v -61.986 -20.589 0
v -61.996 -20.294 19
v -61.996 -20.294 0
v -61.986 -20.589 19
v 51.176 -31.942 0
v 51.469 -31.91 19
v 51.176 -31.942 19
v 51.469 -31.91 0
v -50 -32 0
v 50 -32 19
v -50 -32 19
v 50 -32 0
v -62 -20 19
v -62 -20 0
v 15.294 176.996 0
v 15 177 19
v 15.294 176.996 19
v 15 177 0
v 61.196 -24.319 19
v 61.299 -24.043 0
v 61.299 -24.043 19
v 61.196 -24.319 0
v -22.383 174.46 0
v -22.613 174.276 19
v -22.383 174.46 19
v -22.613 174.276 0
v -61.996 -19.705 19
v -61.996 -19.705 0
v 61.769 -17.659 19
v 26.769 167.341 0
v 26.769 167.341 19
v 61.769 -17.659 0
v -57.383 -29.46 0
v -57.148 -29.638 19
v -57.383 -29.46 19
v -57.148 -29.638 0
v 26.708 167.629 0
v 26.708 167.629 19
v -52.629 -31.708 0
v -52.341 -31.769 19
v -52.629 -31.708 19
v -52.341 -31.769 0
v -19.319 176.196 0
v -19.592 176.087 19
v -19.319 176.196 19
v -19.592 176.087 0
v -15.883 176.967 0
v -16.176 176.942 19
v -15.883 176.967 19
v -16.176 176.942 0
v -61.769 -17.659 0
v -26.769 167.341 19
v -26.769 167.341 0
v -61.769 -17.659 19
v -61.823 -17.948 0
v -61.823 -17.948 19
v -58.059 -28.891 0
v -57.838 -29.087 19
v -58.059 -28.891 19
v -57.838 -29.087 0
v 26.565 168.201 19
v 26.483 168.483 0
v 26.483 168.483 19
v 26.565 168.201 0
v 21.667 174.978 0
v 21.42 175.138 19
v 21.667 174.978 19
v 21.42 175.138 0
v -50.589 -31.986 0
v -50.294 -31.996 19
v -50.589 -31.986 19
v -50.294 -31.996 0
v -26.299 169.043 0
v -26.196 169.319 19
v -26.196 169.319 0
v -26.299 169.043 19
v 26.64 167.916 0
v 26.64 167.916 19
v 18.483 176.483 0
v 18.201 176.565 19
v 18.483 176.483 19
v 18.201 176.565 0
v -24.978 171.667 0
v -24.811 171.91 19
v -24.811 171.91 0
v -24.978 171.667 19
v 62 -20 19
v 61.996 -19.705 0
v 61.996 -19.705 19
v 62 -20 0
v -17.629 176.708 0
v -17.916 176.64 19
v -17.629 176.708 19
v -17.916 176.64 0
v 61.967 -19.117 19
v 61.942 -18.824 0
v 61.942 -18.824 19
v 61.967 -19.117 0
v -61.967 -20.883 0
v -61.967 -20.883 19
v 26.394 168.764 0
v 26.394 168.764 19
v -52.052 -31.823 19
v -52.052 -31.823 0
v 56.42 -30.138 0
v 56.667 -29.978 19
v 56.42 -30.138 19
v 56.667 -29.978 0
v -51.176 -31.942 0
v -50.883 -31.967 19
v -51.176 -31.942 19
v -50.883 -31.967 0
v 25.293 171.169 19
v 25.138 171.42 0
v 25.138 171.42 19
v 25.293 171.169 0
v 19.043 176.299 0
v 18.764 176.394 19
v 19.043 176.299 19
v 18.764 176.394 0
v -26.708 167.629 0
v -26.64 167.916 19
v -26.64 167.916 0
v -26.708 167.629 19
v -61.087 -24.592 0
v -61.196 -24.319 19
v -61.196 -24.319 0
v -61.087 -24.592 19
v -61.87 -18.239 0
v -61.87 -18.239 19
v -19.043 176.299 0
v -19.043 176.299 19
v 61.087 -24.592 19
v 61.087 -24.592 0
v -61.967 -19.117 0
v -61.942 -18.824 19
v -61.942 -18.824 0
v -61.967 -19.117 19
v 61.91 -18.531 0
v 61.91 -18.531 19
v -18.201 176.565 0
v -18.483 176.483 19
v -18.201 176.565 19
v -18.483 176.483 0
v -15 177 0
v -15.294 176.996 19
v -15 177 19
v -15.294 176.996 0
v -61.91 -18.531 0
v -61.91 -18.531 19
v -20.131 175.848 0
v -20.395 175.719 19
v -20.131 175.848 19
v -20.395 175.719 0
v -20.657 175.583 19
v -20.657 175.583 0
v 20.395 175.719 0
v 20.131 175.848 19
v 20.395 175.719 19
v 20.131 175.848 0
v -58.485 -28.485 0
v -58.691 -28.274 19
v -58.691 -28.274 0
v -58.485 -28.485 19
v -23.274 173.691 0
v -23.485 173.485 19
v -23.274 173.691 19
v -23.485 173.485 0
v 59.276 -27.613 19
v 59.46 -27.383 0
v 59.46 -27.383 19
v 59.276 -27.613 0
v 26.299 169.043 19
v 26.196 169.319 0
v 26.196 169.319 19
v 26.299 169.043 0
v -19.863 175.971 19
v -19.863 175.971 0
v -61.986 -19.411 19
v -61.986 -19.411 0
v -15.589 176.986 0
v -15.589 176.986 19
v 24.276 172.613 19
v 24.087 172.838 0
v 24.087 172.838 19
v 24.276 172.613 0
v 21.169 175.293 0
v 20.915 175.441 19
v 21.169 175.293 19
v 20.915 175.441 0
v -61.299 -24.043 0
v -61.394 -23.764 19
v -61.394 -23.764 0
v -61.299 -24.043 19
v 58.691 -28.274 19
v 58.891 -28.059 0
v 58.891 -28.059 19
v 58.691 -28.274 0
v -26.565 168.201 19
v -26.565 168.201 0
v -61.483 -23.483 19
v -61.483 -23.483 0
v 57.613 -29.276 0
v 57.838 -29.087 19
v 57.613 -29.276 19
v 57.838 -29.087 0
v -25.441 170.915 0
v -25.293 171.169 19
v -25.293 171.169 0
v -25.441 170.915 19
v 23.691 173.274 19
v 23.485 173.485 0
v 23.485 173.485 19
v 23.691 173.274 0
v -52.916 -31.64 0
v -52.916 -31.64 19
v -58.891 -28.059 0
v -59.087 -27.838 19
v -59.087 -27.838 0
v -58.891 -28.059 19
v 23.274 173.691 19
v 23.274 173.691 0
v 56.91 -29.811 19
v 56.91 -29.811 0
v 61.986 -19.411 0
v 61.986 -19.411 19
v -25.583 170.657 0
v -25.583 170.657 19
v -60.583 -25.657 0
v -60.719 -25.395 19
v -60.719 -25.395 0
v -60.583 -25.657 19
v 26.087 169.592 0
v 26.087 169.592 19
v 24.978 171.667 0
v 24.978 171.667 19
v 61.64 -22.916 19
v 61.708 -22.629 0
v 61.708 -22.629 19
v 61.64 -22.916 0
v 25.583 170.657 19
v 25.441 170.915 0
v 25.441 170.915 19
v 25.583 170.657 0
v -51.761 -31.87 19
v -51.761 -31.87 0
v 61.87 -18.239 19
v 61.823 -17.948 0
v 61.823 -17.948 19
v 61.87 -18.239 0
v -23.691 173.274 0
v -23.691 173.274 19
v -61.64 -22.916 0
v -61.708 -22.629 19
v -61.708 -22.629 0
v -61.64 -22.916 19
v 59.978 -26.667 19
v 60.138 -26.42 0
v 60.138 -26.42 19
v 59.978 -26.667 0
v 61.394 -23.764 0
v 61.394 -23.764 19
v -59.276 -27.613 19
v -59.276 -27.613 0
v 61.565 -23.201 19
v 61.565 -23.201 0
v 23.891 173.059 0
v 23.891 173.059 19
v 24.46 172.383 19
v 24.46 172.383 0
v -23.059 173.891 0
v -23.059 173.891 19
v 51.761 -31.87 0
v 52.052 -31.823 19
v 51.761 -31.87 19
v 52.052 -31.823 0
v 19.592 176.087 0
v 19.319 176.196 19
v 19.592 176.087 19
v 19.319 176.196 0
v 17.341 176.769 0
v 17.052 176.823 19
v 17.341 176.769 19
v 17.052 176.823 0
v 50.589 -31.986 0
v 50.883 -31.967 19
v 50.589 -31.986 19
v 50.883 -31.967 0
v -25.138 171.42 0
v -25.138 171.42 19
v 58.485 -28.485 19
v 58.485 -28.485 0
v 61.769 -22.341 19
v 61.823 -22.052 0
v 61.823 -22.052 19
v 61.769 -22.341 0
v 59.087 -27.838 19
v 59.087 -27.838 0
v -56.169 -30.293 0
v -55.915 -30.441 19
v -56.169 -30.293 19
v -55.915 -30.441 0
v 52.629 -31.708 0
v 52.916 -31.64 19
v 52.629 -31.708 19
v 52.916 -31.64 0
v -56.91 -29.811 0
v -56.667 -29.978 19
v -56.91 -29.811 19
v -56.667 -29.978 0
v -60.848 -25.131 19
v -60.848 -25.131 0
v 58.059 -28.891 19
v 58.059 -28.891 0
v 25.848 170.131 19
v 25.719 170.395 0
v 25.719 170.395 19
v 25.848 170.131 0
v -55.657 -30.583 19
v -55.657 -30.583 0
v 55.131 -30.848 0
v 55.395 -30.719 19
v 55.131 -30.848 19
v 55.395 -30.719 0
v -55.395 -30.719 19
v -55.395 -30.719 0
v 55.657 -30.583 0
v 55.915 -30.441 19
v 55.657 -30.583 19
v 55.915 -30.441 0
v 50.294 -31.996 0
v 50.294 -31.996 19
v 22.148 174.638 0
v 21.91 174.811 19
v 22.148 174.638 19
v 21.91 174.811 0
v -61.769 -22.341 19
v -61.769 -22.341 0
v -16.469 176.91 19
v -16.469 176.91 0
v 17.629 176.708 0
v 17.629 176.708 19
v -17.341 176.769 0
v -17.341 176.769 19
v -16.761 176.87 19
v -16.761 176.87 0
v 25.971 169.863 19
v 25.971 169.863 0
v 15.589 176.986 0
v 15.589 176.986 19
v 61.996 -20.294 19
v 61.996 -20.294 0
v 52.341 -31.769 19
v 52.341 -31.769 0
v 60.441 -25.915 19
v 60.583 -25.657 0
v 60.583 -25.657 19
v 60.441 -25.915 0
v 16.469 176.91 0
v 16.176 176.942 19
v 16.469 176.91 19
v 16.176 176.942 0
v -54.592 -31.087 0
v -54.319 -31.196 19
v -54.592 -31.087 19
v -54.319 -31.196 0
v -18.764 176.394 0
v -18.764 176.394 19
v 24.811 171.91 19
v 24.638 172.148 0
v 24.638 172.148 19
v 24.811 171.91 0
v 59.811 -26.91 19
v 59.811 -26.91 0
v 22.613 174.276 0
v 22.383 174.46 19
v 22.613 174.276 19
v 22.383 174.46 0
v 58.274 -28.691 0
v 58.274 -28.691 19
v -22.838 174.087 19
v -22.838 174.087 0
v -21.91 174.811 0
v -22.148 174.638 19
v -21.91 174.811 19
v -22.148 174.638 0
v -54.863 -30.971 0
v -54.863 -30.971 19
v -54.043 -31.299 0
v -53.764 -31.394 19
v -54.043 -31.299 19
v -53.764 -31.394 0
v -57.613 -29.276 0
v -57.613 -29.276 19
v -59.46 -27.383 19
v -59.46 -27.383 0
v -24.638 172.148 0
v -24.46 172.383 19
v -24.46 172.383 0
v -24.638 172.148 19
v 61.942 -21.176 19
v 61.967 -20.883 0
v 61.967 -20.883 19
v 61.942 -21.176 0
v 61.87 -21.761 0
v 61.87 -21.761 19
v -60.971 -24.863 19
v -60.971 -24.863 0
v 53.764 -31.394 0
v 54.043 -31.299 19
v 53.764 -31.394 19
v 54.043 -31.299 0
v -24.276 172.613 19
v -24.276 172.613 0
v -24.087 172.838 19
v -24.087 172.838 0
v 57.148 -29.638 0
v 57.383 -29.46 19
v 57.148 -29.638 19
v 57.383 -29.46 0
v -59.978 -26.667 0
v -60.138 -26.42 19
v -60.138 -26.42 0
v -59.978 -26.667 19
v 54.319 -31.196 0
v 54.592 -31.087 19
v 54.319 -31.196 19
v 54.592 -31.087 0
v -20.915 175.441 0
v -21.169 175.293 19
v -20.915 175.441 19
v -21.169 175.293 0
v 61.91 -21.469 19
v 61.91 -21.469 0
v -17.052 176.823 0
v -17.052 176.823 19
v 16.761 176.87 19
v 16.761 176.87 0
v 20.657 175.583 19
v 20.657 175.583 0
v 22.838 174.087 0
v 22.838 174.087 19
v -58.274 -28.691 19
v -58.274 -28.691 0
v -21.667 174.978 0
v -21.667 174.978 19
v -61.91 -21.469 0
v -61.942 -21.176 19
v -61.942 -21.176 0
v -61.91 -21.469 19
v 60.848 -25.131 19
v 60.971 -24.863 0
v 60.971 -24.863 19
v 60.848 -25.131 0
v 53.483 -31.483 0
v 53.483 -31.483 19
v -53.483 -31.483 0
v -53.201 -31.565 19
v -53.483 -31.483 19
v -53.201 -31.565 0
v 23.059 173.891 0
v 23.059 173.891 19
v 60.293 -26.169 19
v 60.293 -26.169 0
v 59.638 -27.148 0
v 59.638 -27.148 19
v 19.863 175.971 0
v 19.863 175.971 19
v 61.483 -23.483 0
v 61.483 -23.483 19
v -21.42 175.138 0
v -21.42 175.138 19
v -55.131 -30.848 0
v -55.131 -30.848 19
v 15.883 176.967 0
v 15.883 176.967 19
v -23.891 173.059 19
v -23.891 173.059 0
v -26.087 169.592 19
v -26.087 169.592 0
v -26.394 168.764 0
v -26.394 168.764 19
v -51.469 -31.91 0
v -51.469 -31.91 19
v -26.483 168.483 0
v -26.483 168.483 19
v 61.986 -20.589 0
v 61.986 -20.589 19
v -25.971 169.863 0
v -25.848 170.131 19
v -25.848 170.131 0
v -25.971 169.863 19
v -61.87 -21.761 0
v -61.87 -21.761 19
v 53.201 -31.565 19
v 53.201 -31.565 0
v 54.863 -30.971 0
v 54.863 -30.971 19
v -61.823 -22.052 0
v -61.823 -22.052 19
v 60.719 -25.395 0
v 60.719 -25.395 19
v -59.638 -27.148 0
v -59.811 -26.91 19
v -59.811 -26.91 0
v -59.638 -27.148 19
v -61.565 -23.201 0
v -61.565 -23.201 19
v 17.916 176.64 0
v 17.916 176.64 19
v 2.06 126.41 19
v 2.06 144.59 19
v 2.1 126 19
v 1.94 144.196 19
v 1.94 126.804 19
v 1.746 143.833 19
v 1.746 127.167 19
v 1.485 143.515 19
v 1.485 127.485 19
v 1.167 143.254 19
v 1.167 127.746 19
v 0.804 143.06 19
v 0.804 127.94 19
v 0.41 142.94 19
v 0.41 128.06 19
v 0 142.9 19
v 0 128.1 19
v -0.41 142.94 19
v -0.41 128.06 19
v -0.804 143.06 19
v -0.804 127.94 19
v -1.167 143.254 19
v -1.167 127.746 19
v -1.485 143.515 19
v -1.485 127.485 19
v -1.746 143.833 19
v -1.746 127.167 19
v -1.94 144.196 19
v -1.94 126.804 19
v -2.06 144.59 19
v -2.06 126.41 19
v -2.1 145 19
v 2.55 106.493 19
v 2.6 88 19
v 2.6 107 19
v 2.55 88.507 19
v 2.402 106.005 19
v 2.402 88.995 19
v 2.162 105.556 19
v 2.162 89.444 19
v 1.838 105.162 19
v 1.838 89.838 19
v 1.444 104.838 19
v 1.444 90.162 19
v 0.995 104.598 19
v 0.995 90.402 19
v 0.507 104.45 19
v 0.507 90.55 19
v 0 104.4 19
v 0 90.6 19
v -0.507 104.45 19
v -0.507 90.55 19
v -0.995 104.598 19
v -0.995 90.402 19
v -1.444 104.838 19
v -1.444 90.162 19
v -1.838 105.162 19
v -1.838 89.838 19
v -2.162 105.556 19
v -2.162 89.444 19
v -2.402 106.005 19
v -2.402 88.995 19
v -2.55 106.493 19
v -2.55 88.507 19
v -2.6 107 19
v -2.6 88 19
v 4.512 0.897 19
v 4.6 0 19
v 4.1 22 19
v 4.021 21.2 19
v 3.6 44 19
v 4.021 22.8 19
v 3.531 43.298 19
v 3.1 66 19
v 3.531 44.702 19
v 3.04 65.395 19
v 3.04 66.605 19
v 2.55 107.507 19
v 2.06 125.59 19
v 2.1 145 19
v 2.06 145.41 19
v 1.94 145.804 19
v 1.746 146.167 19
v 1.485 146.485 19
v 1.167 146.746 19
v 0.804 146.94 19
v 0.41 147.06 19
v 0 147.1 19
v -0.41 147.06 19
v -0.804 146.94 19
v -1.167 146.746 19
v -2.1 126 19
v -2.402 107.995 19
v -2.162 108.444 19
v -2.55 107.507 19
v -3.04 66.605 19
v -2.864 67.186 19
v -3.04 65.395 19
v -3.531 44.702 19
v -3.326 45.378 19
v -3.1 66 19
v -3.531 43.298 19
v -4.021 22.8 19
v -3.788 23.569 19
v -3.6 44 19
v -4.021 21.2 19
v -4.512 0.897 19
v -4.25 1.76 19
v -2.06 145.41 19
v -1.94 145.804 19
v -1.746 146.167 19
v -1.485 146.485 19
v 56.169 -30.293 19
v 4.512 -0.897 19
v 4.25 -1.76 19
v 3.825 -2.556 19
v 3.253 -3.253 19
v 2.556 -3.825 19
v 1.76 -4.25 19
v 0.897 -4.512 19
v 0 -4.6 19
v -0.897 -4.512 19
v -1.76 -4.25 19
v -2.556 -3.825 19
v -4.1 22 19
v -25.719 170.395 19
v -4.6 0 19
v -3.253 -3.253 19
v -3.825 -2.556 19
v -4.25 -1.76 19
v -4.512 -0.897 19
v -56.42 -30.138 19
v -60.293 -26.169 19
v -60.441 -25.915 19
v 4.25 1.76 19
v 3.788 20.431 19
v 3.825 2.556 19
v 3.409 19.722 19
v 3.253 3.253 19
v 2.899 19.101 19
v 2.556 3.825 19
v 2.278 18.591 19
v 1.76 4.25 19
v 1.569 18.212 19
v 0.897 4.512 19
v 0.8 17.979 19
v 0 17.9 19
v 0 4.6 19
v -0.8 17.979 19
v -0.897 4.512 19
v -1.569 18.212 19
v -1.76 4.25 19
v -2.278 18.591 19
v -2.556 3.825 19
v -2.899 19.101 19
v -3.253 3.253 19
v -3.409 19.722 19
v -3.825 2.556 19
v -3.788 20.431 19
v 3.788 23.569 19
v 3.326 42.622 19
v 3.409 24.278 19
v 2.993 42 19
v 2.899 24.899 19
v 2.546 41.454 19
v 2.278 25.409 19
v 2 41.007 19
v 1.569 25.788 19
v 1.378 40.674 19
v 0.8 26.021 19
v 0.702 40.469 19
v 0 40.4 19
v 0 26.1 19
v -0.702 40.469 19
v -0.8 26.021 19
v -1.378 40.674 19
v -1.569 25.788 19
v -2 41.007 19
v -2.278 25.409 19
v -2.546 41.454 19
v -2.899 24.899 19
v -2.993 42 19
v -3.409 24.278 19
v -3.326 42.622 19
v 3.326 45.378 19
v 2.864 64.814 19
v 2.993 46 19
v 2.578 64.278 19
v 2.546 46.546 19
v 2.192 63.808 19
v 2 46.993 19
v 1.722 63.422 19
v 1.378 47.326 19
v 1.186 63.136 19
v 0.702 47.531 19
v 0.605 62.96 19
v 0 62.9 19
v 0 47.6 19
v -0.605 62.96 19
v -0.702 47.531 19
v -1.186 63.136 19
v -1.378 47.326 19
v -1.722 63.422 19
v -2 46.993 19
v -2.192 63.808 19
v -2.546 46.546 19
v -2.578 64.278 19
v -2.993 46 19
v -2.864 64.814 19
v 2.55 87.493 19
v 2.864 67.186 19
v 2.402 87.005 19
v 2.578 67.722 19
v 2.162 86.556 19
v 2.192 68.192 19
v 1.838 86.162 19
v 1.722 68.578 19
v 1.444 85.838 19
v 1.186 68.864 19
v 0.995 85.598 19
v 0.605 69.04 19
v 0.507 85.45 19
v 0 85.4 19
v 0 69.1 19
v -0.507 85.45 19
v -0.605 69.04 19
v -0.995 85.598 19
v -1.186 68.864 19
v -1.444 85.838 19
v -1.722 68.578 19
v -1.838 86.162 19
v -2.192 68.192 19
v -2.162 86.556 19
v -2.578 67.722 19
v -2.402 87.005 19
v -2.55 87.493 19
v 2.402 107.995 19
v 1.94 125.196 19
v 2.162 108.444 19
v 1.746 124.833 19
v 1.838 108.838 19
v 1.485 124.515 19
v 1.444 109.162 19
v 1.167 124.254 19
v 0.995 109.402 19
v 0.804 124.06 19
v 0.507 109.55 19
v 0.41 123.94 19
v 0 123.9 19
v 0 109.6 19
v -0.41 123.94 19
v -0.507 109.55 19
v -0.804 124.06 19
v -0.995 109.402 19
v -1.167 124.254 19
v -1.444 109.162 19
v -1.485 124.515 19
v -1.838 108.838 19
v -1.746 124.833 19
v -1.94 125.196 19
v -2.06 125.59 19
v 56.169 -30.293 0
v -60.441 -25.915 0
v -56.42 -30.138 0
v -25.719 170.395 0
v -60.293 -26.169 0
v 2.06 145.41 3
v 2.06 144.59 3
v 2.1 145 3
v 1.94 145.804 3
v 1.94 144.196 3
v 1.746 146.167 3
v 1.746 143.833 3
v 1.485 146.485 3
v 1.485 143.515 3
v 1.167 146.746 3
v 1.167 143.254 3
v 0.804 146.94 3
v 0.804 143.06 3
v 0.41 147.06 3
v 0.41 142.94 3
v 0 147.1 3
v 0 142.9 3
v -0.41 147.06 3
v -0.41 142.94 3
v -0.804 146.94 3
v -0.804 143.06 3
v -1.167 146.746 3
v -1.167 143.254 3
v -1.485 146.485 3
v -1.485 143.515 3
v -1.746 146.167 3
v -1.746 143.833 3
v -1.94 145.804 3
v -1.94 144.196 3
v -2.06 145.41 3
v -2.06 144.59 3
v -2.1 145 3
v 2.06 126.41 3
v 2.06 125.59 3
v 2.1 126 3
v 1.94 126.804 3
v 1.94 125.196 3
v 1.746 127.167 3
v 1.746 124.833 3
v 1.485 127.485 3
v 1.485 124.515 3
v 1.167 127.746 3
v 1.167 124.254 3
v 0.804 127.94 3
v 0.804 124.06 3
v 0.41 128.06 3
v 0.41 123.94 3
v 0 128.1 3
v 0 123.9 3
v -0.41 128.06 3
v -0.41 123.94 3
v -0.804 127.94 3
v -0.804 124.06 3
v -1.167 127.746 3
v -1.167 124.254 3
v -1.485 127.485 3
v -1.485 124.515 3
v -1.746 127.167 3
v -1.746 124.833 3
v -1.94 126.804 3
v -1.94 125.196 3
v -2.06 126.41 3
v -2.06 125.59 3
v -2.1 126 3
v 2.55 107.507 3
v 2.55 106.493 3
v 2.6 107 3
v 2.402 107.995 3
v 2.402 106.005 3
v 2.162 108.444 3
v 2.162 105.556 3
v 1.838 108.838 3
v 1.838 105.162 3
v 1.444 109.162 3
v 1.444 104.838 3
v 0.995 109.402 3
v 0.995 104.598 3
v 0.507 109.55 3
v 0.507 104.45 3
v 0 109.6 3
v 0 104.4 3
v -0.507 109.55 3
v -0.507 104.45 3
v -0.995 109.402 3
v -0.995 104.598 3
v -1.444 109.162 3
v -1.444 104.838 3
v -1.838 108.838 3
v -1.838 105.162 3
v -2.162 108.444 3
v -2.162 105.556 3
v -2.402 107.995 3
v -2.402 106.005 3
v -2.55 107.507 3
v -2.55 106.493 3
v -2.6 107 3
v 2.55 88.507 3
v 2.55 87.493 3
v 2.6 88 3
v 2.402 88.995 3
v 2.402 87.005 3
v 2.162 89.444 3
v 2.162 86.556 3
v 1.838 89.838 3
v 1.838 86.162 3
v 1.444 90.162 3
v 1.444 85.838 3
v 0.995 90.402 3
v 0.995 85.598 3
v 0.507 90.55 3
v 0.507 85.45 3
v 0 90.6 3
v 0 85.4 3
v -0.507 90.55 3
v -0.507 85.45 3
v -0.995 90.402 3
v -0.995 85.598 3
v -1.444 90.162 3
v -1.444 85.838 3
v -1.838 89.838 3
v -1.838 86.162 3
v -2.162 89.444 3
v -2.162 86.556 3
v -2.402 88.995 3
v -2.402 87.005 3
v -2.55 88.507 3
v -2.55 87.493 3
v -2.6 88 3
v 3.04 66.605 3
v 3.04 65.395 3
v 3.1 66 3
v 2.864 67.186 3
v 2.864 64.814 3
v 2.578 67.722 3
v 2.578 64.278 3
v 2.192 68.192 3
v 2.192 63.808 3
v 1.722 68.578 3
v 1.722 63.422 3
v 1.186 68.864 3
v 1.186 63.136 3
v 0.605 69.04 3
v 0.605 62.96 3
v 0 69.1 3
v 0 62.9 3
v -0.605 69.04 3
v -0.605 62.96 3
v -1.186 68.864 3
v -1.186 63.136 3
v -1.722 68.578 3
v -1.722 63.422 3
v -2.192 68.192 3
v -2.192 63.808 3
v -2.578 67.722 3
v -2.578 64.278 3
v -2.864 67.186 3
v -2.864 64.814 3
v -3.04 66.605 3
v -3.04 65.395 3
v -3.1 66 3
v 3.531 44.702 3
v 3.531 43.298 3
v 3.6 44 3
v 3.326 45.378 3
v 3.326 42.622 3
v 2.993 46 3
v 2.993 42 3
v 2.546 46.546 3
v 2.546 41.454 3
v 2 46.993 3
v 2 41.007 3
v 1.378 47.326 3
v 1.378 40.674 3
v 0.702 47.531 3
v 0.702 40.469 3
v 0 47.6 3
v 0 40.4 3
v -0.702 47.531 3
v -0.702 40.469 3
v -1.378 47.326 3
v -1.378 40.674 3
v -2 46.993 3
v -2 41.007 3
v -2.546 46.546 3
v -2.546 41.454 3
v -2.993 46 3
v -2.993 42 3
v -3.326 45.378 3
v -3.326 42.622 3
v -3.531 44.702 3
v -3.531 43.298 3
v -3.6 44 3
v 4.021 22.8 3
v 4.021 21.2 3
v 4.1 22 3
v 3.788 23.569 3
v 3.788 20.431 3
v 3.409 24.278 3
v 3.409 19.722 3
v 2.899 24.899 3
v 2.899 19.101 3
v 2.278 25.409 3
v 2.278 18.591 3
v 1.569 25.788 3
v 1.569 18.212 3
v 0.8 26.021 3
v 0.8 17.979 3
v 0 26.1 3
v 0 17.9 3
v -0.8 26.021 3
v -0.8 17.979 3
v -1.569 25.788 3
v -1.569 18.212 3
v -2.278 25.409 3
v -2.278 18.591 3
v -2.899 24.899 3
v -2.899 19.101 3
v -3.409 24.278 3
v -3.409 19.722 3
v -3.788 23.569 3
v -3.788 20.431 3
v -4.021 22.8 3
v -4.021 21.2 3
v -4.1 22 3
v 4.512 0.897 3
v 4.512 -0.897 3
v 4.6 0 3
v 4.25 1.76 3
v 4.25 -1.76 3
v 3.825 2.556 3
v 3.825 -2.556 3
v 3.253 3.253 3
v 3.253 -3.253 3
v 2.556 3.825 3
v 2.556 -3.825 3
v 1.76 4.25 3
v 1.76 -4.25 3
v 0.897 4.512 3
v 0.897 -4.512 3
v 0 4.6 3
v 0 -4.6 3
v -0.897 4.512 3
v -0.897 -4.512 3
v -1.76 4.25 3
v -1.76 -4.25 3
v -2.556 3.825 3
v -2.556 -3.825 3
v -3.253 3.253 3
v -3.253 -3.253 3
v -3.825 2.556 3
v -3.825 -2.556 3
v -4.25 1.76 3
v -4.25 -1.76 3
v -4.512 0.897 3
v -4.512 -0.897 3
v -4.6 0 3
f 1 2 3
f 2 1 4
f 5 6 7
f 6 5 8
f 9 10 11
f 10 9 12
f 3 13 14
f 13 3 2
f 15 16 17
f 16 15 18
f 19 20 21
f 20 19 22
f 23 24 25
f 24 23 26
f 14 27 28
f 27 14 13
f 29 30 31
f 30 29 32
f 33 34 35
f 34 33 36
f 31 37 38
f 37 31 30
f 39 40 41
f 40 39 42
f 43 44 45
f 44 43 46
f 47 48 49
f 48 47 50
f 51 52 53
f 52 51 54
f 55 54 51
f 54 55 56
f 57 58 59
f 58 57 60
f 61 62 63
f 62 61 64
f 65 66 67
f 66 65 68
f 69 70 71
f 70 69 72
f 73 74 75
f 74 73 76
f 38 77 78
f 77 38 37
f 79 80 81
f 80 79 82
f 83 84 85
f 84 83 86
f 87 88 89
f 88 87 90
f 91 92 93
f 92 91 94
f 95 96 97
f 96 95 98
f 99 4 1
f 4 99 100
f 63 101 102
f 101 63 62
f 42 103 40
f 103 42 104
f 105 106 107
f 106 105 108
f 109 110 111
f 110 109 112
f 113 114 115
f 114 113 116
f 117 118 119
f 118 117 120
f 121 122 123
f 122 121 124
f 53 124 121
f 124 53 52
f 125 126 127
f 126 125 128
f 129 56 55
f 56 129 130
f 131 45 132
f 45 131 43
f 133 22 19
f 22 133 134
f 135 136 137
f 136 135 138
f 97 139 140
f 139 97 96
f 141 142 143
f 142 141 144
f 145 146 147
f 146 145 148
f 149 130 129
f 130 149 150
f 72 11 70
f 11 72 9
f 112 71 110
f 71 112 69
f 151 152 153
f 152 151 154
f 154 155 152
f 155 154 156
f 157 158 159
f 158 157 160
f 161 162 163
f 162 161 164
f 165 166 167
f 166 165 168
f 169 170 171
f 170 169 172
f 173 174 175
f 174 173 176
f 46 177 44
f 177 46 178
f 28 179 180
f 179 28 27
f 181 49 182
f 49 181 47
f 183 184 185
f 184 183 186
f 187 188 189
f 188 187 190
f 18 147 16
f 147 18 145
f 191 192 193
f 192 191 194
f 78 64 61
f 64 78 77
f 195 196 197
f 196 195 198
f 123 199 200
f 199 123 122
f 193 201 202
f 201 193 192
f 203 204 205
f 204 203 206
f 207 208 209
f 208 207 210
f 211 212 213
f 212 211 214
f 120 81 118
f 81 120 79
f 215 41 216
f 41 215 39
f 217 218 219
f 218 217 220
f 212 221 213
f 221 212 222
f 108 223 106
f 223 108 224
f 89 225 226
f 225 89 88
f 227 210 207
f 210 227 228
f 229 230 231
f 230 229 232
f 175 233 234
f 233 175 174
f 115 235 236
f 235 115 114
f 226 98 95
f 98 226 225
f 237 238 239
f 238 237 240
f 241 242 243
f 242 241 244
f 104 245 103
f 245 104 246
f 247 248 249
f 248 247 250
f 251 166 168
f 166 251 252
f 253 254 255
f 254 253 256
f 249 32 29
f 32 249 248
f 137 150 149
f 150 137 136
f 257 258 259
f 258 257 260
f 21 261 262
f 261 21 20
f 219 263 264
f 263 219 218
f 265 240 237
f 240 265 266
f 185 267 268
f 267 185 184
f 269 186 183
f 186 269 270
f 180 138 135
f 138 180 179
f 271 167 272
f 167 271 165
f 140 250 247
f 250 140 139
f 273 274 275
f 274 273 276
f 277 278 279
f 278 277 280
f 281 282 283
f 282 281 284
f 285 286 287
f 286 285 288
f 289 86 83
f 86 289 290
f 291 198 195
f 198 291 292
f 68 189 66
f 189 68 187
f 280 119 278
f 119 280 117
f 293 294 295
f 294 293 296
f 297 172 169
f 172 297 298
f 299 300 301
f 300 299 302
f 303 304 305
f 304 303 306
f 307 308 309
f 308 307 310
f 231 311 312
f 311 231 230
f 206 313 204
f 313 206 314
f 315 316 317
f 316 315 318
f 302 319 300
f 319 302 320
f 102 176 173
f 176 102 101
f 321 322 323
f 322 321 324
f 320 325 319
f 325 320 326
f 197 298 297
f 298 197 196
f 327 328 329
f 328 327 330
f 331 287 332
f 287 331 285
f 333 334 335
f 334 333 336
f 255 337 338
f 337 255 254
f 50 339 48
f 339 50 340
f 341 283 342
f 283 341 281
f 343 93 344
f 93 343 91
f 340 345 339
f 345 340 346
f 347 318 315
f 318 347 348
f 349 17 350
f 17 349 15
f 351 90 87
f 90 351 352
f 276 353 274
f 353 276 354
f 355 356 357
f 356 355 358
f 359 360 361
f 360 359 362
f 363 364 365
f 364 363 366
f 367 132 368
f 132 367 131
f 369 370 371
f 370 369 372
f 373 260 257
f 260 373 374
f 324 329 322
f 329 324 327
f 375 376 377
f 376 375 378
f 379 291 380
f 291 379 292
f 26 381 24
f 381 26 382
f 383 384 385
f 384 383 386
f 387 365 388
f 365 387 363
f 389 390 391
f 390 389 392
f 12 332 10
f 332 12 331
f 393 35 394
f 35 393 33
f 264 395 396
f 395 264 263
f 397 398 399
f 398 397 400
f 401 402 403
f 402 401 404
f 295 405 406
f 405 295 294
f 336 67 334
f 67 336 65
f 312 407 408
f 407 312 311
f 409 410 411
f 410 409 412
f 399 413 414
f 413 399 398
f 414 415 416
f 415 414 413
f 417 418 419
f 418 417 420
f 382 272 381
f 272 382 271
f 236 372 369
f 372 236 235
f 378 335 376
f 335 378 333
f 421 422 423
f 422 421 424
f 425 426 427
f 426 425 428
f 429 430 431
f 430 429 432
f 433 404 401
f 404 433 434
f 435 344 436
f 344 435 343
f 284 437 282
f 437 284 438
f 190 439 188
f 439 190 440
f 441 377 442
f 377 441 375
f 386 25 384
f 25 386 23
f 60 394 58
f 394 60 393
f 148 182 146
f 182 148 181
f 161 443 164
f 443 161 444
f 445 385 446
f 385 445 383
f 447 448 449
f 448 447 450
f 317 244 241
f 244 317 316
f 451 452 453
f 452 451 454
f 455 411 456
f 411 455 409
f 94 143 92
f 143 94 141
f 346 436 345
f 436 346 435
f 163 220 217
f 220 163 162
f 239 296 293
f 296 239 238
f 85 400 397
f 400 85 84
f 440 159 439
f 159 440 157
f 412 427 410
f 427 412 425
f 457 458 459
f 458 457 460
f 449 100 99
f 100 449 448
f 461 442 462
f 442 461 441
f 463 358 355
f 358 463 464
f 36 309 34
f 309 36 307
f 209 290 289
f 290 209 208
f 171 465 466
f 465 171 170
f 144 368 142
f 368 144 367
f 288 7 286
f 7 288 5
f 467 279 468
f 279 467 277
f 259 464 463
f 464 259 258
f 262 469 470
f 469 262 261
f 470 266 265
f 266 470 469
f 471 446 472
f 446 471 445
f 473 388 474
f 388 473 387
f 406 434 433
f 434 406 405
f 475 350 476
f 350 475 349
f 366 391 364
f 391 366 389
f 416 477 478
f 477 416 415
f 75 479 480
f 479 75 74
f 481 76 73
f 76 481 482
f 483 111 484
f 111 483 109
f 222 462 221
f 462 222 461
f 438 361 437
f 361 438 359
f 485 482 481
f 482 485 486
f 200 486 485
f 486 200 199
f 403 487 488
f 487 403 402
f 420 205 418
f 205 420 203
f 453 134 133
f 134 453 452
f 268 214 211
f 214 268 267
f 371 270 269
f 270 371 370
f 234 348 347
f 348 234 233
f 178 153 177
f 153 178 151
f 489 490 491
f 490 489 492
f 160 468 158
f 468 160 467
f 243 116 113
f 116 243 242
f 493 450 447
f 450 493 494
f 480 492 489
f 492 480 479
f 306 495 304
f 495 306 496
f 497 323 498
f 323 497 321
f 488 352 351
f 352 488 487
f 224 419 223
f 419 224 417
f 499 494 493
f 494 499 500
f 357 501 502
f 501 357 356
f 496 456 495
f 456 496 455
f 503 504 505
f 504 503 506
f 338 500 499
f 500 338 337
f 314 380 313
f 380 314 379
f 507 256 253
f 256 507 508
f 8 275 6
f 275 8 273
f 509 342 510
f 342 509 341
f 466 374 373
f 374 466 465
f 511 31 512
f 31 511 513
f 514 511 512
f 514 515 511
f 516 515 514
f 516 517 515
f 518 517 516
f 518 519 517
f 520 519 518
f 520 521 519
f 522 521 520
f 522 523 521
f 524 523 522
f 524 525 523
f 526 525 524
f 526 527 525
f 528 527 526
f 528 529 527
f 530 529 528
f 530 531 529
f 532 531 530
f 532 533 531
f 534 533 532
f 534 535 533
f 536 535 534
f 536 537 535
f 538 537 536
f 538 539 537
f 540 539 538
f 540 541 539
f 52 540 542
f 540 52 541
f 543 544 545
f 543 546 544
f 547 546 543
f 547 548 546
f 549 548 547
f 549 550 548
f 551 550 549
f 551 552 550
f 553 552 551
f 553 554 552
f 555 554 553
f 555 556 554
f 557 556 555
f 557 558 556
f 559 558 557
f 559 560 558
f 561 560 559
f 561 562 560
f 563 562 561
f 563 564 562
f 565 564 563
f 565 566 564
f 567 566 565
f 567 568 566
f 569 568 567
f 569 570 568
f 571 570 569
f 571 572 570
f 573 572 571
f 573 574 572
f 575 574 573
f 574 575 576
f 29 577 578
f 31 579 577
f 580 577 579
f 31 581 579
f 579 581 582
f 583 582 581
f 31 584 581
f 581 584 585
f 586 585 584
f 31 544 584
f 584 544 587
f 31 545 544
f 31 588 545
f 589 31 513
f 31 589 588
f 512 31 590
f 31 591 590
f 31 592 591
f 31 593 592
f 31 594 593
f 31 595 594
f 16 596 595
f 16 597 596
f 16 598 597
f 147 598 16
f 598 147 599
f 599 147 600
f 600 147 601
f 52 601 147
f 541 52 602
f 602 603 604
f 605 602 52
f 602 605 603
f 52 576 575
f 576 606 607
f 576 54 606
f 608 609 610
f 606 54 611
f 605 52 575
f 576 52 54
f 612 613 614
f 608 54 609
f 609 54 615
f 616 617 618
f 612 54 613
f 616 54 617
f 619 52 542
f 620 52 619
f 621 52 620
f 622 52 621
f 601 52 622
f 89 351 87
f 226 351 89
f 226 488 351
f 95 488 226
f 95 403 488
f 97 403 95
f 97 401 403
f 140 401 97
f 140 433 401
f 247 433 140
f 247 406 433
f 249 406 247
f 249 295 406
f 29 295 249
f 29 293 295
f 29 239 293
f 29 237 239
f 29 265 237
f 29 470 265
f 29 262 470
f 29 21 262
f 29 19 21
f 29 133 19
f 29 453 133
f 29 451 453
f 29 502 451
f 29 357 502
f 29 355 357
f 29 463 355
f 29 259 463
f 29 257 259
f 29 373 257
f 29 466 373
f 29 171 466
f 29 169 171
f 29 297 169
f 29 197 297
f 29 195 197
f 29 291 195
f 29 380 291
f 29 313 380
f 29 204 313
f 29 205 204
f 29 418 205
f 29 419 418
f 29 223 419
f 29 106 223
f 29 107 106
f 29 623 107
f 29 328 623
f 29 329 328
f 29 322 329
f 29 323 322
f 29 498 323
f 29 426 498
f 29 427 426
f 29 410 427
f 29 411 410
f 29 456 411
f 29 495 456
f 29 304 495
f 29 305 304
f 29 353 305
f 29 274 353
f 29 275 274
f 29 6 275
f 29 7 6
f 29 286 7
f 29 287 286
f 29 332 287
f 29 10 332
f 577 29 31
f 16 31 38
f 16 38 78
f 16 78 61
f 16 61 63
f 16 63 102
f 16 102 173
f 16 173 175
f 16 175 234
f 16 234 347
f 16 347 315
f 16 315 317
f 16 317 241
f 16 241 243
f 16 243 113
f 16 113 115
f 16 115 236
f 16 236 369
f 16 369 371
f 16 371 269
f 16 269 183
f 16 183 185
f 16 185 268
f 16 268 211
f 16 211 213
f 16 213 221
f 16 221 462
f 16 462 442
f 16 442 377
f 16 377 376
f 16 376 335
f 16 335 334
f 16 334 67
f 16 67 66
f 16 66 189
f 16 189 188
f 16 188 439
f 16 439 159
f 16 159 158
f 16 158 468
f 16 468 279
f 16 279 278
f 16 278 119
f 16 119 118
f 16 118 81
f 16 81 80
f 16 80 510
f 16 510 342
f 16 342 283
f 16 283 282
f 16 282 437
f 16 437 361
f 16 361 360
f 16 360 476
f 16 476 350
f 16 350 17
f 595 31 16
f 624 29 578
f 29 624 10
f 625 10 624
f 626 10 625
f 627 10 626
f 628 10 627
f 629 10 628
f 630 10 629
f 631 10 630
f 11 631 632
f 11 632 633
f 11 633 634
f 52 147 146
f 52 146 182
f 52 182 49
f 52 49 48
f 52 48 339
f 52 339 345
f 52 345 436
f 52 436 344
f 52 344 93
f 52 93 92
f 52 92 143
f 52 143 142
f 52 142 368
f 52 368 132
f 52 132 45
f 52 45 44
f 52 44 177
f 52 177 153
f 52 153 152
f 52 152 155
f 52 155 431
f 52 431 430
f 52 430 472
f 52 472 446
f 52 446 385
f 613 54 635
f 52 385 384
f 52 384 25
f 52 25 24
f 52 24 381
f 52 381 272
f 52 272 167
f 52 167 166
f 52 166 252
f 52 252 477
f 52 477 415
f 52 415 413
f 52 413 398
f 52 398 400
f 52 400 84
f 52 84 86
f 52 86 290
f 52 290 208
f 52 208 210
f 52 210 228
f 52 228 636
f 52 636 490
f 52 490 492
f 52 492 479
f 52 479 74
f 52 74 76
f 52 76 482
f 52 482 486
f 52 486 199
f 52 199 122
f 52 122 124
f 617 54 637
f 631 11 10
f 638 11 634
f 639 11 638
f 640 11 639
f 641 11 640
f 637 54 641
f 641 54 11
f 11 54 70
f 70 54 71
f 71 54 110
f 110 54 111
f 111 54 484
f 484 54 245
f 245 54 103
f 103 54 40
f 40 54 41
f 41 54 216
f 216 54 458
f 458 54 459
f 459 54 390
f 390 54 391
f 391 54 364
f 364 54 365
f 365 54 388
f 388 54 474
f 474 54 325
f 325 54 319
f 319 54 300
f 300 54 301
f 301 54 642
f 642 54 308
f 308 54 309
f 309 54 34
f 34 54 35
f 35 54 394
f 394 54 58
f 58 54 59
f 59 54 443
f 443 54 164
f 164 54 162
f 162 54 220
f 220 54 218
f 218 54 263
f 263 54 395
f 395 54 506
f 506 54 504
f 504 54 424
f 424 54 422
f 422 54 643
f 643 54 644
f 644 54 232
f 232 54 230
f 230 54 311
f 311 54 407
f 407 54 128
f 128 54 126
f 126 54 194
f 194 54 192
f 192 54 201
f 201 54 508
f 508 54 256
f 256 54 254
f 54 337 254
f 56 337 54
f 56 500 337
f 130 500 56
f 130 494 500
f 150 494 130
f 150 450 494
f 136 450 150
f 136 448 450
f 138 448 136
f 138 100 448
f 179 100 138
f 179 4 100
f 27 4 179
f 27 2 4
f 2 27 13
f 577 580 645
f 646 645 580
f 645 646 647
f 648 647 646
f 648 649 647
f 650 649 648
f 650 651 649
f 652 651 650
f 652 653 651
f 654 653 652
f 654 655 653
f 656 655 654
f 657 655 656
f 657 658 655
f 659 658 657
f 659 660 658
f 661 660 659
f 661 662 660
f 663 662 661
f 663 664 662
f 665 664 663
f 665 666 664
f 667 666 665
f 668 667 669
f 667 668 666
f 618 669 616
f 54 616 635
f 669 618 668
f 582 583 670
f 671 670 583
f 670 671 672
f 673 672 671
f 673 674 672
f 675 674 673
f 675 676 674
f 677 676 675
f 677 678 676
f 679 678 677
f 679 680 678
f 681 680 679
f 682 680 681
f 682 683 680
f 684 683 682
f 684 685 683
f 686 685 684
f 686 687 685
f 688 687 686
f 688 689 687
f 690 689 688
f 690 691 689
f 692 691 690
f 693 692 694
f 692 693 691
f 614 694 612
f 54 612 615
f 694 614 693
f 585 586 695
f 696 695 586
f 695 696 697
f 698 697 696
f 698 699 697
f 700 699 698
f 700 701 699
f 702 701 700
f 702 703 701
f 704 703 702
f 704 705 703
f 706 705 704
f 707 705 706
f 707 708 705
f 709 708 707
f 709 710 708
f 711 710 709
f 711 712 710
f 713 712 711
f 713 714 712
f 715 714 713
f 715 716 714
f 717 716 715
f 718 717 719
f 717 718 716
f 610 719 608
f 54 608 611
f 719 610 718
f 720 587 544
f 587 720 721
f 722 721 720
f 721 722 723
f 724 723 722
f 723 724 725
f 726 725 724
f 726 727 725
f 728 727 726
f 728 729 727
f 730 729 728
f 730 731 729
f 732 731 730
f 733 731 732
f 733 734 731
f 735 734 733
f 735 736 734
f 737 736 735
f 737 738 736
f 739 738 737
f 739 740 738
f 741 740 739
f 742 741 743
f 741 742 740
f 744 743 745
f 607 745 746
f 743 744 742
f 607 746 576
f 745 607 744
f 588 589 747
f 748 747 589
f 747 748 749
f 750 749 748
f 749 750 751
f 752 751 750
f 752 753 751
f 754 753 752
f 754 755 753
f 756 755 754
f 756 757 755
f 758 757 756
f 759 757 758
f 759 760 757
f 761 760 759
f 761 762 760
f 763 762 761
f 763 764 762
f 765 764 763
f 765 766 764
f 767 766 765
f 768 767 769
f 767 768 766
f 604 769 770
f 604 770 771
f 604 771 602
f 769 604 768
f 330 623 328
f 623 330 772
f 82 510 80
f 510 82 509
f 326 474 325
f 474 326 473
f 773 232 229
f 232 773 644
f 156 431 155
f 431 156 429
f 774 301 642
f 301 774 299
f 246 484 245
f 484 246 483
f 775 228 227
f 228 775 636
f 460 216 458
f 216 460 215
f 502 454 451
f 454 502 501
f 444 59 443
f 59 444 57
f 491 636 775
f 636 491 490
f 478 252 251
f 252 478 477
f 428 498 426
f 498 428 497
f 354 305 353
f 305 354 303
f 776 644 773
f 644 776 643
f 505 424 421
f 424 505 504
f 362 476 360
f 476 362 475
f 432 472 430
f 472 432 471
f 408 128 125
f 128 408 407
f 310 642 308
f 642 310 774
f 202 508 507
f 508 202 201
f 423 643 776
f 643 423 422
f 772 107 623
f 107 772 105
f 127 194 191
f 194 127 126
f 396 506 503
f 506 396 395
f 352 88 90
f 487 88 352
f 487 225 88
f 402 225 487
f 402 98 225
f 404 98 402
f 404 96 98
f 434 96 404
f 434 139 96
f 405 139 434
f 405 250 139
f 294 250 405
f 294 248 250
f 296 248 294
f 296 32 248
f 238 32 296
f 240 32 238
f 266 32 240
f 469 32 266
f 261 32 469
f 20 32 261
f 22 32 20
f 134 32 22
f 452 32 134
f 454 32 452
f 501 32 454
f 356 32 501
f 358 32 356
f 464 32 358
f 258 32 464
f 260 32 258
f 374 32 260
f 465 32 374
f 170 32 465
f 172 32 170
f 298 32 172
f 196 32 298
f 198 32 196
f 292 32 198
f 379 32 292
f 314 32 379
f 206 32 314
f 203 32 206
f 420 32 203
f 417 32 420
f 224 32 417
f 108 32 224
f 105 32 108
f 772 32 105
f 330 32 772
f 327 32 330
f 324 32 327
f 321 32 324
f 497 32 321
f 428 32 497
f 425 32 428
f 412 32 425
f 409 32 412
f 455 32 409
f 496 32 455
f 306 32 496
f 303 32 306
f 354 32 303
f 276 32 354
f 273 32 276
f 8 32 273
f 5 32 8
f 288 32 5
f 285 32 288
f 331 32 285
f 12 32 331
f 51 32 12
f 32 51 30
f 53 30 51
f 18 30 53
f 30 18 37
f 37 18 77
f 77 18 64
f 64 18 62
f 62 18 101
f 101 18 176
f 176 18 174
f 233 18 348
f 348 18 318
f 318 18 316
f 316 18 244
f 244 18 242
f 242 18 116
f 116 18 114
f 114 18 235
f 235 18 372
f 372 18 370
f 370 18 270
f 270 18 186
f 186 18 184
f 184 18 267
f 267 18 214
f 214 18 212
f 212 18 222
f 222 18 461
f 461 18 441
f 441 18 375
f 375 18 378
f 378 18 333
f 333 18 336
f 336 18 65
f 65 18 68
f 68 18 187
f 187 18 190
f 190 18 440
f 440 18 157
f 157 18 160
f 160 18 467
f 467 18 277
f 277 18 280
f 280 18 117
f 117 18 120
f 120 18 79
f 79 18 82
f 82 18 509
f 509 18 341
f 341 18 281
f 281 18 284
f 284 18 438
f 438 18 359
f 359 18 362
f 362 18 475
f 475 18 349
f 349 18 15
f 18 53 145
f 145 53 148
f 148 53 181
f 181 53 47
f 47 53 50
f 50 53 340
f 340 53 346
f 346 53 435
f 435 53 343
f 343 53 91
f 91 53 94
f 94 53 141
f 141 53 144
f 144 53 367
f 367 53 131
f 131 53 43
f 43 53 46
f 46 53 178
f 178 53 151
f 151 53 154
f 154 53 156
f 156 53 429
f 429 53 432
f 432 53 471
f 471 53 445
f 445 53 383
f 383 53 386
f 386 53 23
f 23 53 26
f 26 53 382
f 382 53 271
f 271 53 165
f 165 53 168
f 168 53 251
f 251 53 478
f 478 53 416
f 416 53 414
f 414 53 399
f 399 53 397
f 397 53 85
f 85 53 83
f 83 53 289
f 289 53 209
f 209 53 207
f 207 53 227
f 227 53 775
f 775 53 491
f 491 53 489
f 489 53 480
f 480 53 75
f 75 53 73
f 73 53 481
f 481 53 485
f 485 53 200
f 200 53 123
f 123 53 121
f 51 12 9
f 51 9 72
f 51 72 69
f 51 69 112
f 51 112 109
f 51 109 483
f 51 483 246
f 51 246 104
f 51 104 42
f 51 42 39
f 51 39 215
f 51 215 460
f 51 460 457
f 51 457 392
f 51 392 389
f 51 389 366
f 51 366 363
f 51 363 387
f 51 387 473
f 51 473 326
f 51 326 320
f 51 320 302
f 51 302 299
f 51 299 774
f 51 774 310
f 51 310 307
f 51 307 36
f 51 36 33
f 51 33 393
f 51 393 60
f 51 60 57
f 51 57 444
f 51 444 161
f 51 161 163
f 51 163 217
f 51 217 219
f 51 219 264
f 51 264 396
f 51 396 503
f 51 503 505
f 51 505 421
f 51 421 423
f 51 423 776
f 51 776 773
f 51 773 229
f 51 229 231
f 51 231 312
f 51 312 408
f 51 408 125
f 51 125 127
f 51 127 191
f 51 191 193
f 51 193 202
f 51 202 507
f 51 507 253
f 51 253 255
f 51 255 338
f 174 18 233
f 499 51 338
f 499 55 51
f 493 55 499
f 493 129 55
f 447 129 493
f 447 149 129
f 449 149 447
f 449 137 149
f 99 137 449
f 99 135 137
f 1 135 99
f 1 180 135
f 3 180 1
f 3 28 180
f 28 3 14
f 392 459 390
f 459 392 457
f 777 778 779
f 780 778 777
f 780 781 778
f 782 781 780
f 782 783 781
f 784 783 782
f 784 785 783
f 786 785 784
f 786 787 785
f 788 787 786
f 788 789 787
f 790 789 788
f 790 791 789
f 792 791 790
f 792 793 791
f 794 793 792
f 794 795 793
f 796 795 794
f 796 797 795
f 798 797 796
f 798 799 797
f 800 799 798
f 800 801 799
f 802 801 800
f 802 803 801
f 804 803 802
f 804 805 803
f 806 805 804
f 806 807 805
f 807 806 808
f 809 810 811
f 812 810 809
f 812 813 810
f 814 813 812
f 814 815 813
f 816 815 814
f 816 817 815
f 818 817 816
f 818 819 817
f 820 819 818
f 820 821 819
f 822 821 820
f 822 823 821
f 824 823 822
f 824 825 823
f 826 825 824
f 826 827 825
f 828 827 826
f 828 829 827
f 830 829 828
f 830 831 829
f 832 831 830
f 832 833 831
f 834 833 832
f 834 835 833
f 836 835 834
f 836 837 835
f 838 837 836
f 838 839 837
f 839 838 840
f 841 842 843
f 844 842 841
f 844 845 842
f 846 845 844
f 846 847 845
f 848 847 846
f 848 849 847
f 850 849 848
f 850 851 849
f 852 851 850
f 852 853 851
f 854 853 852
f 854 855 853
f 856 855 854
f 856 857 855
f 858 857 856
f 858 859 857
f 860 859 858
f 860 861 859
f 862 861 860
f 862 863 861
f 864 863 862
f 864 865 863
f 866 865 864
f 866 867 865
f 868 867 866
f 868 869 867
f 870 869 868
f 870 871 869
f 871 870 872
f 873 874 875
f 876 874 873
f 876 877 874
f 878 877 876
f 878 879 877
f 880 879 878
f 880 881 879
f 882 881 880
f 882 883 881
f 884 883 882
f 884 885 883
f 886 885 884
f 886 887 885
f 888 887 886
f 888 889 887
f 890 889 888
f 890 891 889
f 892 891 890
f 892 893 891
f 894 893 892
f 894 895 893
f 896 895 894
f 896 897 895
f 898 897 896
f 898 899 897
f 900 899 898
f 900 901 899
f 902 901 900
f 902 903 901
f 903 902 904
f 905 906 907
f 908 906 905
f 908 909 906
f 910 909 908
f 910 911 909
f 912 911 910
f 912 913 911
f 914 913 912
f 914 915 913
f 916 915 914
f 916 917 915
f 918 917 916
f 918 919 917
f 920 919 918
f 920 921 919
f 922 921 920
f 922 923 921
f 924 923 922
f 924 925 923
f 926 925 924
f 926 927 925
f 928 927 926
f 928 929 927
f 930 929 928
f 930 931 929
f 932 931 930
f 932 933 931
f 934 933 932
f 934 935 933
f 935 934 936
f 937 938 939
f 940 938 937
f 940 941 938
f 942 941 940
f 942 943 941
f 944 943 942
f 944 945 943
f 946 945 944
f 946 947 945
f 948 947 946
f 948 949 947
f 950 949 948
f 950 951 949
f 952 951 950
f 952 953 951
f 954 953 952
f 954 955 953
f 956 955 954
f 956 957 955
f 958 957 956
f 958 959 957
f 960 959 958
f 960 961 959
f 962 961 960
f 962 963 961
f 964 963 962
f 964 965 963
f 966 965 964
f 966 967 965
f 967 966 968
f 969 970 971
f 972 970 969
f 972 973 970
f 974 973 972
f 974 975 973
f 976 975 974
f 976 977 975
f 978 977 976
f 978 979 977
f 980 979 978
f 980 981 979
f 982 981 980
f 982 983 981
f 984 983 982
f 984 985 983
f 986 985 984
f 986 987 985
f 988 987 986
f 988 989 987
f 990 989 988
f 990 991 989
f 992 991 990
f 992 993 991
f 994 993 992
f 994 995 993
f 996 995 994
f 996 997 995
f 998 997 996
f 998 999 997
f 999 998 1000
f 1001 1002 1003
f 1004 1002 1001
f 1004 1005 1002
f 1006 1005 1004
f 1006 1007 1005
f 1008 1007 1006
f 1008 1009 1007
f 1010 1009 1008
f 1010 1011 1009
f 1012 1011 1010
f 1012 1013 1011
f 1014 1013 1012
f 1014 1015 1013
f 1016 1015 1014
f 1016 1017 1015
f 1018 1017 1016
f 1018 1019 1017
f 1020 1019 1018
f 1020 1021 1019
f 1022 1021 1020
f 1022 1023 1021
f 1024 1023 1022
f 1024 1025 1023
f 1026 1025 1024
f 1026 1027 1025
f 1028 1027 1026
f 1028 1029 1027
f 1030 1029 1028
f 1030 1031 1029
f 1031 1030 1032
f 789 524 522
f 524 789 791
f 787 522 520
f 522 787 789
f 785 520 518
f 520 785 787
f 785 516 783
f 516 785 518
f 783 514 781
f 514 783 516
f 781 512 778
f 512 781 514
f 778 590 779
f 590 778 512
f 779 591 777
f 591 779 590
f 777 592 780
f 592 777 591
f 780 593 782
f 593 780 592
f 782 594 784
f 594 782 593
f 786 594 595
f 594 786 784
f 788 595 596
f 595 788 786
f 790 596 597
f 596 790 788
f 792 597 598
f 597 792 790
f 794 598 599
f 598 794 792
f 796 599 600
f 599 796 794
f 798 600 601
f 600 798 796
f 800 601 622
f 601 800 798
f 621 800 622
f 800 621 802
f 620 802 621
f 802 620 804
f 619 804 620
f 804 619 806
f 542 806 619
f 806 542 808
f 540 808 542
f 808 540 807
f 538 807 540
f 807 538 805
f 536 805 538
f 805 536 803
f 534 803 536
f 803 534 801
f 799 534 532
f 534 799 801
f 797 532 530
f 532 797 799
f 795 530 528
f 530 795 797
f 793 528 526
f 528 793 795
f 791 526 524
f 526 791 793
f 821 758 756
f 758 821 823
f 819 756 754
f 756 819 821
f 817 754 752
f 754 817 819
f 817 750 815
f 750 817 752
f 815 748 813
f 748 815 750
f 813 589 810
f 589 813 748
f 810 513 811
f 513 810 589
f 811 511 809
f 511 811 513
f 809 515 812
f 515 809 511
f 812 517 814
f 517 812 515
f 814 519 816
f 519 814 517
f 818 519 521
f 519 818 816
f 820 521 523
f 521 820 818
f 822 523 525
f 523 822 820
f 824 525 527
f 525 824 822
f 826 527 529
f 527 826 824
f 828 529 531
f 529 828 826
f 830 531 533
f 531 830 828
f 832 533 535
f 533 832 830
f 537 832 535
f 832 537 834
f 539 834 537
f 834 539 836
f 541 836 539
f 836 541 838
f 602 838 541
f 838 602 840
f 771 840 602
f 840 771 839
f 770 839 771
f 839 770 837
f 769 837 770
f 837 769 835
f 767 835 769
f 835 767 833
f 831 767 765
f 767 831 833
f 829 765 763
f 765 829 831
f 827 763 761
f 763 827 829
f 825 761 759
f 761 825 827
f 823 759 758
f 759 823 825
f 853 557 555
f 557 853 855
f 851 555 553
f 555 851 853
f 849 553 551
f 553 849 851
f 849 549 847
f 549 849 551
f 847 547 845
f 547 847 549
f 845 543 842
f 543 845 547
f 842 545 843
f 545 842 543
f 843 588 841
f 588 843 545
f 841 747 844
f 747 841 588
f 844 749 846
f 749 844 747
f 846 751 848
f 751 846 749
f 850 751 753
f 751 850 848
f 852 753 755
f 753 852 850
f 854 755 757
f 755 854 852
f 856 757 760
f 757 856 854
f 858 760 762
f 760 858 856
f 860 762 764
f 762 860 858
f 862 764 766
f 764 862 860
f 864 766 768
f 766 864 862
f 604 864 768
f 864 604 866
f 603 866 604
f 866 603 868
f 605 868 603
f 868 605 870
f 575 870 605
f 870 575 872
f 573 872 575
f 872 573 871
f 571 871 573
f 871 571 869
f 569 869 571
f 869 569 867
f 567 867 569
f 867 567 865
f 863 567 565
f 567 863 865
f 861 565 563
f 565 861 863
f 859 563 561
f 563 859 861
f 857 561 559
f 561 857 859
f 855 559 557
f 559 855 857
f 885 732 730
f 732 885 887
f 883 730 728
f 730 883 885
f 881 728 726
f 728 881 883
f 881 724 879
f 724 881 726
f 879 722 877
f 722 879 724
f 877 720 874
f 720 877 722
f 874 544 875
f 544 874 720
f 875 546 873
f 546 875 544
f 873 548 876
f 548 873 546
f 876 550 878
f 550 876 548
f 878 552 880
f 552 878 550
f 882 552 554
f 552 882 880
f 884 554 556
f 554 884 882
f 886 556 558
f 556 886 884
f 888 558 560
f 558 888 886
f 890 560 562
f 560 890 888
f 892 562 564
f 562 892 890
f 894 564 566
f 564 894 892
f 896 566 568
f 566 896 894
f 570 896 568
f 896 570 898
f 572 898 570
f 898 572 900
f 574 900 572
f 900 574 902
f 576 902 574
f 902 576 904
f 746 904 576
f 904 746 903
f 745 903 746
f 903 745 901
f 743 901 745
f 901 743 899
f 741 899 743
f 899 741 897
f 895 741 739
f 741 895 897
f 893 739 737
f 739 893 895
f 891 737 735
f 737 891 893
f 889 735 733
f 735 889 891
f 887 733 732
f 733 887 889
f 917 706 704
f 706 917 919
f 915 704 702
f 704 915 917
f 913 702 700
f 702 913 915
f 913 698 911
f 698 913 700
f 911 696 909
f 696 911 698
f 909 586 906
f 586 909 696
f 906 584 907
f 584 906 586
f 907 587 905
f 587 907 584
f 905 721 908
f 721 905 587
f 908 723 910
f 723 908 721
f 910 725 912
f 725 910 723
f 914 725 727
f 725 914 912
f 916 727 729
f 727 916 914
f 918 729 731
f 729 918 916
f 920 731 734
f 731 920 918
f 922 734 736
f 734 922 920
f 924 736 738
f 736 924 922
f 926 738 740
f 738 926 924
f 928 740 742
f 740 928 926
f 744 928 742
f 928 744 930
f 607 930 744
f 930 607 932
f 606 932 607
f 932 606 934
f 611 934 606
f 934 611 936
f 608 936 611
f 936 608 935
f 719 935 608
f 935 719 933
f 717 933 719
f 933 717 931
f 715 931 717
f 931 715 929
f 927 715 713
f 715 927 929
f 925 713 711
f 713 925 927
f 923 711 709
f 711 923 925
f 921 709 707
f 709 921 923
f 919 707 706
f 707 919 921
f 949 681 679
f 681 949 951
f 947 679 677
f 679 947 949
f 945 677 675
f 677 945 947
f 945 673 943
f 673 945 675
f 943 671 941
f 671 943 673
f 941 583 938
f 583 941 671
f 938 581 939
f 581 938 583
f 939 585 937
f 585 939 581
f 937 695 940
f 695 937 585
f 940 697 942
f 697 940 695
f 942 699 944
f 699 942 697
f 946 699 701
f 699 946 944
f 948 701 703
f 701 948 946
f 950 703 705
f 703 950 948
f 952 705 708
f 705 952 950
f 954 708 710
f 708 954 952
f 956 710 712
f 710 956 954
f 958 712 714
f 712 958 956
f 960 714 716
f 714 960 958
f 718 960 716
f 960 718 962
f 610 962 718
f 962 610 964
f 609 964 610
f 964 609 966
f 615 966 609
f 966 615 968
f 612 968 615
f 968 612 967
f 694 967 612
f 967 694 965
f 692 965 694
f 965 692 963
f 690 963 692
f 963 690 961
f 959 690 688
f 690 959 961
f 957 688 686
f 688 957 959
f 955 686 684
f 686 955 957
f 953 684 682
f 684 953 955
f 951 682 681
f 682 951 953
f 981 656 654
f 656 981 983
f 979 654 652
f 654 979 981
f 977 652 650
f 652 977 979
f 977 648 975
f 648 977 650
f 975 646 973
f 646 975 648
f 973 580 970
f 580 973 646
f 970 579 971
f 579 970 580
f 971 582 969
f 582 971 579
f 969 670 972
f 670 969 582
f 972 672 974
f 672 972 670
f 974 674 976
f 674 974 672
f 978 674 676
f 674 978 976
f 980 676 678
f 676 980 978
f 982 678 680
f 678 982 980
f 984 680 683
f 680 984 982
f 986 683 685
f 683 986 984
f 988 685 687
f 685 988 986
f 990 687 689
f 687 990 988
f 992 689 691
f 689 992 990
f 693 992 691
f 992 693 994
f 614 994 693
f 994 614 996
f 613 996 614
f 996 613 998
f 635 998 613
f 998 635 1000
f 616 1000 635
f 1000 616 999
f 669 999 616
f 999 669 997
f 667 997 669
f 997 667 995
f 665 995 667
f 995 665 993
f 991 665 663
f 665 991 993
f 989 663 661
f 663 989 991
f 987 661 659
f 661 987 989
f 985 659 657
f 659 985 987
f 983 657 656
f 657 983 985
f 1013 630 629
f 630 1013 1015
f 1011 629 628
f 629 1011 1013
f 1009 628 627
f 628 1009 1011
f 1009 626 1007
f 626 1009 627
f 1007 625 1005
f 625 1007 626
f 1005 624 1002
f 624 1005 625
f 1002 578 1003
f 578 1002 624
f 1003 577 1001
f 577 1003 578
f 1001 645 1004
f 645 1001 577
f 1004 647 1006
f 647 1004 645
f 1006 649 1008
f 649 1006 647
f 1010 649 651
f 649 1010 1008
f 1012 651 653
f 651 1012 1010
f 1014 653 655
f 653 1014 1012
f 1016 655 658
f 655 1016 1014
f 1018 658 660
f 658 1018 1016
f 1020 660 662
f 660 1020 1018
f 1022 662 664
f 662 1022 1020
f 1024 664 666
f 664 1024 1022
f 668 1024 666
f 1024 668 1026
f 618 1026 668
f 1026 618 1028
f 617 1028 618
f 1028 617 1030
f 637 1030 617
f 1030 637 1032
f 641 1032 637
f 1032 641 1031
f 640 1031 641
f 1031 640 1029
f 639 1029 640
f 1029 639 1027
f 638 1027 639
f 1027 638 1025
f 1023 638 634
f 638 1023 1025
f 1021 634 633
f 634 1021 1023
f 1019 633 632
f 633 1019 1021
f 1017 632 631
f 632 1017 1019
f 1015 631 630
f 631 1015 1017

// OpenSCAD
// file: rack_lib.scad
gMaterialThick = 19;
gBitSize = 4;

CornerPos = [[50,-20],[15,20]];
CornerRadius = 12;

// [hole size, handle width]
TorxSet = [[9, 20], [8, 16], [7, 16], [6, 16],
           [5, 16], [5, 13], [4, 13], [4, 13]];

Zero = [CornerPos[0][0]+CornerRadius,-CornerPos[0][1]+CornerRadius];

function _offset(set, spacing, i) = (
  i == 0 ? 0 : spacing + set[i][1] + _offset(set, spacing, i-1));

module RackHoles(set, spacing, hole_extra=0.2) {
  for(i=[0:len(set)-1]) translate([0,_offset(set, spacing, i)])
    circle(d=set[i][0]+hole_extra, $fn=32);
}

module RackOutline(set, spacing) {
  length = _offset(set, spacing, len(set)-1);
  hull() for(x_scale=[1,-1]) scale([x_scale,1]) {
    translate(CornerPos[0]) circle(r=CornerRadius,$fn=256);
    translate([0,length]) translate(CornerPos[1]) circle(r=CornerRadius,$fn=256);
  }
}
// main file
include <rack_lib.scad>;

difference() {
  linear_extrude(height=gMaterialThick,convexity=2) RackOutline(TorxSet, 6);
  translate([0,0,3])
    linear_extrude(height=gMaterialThick,convexity=20) RackHoles(TorxSet, 6);
}
